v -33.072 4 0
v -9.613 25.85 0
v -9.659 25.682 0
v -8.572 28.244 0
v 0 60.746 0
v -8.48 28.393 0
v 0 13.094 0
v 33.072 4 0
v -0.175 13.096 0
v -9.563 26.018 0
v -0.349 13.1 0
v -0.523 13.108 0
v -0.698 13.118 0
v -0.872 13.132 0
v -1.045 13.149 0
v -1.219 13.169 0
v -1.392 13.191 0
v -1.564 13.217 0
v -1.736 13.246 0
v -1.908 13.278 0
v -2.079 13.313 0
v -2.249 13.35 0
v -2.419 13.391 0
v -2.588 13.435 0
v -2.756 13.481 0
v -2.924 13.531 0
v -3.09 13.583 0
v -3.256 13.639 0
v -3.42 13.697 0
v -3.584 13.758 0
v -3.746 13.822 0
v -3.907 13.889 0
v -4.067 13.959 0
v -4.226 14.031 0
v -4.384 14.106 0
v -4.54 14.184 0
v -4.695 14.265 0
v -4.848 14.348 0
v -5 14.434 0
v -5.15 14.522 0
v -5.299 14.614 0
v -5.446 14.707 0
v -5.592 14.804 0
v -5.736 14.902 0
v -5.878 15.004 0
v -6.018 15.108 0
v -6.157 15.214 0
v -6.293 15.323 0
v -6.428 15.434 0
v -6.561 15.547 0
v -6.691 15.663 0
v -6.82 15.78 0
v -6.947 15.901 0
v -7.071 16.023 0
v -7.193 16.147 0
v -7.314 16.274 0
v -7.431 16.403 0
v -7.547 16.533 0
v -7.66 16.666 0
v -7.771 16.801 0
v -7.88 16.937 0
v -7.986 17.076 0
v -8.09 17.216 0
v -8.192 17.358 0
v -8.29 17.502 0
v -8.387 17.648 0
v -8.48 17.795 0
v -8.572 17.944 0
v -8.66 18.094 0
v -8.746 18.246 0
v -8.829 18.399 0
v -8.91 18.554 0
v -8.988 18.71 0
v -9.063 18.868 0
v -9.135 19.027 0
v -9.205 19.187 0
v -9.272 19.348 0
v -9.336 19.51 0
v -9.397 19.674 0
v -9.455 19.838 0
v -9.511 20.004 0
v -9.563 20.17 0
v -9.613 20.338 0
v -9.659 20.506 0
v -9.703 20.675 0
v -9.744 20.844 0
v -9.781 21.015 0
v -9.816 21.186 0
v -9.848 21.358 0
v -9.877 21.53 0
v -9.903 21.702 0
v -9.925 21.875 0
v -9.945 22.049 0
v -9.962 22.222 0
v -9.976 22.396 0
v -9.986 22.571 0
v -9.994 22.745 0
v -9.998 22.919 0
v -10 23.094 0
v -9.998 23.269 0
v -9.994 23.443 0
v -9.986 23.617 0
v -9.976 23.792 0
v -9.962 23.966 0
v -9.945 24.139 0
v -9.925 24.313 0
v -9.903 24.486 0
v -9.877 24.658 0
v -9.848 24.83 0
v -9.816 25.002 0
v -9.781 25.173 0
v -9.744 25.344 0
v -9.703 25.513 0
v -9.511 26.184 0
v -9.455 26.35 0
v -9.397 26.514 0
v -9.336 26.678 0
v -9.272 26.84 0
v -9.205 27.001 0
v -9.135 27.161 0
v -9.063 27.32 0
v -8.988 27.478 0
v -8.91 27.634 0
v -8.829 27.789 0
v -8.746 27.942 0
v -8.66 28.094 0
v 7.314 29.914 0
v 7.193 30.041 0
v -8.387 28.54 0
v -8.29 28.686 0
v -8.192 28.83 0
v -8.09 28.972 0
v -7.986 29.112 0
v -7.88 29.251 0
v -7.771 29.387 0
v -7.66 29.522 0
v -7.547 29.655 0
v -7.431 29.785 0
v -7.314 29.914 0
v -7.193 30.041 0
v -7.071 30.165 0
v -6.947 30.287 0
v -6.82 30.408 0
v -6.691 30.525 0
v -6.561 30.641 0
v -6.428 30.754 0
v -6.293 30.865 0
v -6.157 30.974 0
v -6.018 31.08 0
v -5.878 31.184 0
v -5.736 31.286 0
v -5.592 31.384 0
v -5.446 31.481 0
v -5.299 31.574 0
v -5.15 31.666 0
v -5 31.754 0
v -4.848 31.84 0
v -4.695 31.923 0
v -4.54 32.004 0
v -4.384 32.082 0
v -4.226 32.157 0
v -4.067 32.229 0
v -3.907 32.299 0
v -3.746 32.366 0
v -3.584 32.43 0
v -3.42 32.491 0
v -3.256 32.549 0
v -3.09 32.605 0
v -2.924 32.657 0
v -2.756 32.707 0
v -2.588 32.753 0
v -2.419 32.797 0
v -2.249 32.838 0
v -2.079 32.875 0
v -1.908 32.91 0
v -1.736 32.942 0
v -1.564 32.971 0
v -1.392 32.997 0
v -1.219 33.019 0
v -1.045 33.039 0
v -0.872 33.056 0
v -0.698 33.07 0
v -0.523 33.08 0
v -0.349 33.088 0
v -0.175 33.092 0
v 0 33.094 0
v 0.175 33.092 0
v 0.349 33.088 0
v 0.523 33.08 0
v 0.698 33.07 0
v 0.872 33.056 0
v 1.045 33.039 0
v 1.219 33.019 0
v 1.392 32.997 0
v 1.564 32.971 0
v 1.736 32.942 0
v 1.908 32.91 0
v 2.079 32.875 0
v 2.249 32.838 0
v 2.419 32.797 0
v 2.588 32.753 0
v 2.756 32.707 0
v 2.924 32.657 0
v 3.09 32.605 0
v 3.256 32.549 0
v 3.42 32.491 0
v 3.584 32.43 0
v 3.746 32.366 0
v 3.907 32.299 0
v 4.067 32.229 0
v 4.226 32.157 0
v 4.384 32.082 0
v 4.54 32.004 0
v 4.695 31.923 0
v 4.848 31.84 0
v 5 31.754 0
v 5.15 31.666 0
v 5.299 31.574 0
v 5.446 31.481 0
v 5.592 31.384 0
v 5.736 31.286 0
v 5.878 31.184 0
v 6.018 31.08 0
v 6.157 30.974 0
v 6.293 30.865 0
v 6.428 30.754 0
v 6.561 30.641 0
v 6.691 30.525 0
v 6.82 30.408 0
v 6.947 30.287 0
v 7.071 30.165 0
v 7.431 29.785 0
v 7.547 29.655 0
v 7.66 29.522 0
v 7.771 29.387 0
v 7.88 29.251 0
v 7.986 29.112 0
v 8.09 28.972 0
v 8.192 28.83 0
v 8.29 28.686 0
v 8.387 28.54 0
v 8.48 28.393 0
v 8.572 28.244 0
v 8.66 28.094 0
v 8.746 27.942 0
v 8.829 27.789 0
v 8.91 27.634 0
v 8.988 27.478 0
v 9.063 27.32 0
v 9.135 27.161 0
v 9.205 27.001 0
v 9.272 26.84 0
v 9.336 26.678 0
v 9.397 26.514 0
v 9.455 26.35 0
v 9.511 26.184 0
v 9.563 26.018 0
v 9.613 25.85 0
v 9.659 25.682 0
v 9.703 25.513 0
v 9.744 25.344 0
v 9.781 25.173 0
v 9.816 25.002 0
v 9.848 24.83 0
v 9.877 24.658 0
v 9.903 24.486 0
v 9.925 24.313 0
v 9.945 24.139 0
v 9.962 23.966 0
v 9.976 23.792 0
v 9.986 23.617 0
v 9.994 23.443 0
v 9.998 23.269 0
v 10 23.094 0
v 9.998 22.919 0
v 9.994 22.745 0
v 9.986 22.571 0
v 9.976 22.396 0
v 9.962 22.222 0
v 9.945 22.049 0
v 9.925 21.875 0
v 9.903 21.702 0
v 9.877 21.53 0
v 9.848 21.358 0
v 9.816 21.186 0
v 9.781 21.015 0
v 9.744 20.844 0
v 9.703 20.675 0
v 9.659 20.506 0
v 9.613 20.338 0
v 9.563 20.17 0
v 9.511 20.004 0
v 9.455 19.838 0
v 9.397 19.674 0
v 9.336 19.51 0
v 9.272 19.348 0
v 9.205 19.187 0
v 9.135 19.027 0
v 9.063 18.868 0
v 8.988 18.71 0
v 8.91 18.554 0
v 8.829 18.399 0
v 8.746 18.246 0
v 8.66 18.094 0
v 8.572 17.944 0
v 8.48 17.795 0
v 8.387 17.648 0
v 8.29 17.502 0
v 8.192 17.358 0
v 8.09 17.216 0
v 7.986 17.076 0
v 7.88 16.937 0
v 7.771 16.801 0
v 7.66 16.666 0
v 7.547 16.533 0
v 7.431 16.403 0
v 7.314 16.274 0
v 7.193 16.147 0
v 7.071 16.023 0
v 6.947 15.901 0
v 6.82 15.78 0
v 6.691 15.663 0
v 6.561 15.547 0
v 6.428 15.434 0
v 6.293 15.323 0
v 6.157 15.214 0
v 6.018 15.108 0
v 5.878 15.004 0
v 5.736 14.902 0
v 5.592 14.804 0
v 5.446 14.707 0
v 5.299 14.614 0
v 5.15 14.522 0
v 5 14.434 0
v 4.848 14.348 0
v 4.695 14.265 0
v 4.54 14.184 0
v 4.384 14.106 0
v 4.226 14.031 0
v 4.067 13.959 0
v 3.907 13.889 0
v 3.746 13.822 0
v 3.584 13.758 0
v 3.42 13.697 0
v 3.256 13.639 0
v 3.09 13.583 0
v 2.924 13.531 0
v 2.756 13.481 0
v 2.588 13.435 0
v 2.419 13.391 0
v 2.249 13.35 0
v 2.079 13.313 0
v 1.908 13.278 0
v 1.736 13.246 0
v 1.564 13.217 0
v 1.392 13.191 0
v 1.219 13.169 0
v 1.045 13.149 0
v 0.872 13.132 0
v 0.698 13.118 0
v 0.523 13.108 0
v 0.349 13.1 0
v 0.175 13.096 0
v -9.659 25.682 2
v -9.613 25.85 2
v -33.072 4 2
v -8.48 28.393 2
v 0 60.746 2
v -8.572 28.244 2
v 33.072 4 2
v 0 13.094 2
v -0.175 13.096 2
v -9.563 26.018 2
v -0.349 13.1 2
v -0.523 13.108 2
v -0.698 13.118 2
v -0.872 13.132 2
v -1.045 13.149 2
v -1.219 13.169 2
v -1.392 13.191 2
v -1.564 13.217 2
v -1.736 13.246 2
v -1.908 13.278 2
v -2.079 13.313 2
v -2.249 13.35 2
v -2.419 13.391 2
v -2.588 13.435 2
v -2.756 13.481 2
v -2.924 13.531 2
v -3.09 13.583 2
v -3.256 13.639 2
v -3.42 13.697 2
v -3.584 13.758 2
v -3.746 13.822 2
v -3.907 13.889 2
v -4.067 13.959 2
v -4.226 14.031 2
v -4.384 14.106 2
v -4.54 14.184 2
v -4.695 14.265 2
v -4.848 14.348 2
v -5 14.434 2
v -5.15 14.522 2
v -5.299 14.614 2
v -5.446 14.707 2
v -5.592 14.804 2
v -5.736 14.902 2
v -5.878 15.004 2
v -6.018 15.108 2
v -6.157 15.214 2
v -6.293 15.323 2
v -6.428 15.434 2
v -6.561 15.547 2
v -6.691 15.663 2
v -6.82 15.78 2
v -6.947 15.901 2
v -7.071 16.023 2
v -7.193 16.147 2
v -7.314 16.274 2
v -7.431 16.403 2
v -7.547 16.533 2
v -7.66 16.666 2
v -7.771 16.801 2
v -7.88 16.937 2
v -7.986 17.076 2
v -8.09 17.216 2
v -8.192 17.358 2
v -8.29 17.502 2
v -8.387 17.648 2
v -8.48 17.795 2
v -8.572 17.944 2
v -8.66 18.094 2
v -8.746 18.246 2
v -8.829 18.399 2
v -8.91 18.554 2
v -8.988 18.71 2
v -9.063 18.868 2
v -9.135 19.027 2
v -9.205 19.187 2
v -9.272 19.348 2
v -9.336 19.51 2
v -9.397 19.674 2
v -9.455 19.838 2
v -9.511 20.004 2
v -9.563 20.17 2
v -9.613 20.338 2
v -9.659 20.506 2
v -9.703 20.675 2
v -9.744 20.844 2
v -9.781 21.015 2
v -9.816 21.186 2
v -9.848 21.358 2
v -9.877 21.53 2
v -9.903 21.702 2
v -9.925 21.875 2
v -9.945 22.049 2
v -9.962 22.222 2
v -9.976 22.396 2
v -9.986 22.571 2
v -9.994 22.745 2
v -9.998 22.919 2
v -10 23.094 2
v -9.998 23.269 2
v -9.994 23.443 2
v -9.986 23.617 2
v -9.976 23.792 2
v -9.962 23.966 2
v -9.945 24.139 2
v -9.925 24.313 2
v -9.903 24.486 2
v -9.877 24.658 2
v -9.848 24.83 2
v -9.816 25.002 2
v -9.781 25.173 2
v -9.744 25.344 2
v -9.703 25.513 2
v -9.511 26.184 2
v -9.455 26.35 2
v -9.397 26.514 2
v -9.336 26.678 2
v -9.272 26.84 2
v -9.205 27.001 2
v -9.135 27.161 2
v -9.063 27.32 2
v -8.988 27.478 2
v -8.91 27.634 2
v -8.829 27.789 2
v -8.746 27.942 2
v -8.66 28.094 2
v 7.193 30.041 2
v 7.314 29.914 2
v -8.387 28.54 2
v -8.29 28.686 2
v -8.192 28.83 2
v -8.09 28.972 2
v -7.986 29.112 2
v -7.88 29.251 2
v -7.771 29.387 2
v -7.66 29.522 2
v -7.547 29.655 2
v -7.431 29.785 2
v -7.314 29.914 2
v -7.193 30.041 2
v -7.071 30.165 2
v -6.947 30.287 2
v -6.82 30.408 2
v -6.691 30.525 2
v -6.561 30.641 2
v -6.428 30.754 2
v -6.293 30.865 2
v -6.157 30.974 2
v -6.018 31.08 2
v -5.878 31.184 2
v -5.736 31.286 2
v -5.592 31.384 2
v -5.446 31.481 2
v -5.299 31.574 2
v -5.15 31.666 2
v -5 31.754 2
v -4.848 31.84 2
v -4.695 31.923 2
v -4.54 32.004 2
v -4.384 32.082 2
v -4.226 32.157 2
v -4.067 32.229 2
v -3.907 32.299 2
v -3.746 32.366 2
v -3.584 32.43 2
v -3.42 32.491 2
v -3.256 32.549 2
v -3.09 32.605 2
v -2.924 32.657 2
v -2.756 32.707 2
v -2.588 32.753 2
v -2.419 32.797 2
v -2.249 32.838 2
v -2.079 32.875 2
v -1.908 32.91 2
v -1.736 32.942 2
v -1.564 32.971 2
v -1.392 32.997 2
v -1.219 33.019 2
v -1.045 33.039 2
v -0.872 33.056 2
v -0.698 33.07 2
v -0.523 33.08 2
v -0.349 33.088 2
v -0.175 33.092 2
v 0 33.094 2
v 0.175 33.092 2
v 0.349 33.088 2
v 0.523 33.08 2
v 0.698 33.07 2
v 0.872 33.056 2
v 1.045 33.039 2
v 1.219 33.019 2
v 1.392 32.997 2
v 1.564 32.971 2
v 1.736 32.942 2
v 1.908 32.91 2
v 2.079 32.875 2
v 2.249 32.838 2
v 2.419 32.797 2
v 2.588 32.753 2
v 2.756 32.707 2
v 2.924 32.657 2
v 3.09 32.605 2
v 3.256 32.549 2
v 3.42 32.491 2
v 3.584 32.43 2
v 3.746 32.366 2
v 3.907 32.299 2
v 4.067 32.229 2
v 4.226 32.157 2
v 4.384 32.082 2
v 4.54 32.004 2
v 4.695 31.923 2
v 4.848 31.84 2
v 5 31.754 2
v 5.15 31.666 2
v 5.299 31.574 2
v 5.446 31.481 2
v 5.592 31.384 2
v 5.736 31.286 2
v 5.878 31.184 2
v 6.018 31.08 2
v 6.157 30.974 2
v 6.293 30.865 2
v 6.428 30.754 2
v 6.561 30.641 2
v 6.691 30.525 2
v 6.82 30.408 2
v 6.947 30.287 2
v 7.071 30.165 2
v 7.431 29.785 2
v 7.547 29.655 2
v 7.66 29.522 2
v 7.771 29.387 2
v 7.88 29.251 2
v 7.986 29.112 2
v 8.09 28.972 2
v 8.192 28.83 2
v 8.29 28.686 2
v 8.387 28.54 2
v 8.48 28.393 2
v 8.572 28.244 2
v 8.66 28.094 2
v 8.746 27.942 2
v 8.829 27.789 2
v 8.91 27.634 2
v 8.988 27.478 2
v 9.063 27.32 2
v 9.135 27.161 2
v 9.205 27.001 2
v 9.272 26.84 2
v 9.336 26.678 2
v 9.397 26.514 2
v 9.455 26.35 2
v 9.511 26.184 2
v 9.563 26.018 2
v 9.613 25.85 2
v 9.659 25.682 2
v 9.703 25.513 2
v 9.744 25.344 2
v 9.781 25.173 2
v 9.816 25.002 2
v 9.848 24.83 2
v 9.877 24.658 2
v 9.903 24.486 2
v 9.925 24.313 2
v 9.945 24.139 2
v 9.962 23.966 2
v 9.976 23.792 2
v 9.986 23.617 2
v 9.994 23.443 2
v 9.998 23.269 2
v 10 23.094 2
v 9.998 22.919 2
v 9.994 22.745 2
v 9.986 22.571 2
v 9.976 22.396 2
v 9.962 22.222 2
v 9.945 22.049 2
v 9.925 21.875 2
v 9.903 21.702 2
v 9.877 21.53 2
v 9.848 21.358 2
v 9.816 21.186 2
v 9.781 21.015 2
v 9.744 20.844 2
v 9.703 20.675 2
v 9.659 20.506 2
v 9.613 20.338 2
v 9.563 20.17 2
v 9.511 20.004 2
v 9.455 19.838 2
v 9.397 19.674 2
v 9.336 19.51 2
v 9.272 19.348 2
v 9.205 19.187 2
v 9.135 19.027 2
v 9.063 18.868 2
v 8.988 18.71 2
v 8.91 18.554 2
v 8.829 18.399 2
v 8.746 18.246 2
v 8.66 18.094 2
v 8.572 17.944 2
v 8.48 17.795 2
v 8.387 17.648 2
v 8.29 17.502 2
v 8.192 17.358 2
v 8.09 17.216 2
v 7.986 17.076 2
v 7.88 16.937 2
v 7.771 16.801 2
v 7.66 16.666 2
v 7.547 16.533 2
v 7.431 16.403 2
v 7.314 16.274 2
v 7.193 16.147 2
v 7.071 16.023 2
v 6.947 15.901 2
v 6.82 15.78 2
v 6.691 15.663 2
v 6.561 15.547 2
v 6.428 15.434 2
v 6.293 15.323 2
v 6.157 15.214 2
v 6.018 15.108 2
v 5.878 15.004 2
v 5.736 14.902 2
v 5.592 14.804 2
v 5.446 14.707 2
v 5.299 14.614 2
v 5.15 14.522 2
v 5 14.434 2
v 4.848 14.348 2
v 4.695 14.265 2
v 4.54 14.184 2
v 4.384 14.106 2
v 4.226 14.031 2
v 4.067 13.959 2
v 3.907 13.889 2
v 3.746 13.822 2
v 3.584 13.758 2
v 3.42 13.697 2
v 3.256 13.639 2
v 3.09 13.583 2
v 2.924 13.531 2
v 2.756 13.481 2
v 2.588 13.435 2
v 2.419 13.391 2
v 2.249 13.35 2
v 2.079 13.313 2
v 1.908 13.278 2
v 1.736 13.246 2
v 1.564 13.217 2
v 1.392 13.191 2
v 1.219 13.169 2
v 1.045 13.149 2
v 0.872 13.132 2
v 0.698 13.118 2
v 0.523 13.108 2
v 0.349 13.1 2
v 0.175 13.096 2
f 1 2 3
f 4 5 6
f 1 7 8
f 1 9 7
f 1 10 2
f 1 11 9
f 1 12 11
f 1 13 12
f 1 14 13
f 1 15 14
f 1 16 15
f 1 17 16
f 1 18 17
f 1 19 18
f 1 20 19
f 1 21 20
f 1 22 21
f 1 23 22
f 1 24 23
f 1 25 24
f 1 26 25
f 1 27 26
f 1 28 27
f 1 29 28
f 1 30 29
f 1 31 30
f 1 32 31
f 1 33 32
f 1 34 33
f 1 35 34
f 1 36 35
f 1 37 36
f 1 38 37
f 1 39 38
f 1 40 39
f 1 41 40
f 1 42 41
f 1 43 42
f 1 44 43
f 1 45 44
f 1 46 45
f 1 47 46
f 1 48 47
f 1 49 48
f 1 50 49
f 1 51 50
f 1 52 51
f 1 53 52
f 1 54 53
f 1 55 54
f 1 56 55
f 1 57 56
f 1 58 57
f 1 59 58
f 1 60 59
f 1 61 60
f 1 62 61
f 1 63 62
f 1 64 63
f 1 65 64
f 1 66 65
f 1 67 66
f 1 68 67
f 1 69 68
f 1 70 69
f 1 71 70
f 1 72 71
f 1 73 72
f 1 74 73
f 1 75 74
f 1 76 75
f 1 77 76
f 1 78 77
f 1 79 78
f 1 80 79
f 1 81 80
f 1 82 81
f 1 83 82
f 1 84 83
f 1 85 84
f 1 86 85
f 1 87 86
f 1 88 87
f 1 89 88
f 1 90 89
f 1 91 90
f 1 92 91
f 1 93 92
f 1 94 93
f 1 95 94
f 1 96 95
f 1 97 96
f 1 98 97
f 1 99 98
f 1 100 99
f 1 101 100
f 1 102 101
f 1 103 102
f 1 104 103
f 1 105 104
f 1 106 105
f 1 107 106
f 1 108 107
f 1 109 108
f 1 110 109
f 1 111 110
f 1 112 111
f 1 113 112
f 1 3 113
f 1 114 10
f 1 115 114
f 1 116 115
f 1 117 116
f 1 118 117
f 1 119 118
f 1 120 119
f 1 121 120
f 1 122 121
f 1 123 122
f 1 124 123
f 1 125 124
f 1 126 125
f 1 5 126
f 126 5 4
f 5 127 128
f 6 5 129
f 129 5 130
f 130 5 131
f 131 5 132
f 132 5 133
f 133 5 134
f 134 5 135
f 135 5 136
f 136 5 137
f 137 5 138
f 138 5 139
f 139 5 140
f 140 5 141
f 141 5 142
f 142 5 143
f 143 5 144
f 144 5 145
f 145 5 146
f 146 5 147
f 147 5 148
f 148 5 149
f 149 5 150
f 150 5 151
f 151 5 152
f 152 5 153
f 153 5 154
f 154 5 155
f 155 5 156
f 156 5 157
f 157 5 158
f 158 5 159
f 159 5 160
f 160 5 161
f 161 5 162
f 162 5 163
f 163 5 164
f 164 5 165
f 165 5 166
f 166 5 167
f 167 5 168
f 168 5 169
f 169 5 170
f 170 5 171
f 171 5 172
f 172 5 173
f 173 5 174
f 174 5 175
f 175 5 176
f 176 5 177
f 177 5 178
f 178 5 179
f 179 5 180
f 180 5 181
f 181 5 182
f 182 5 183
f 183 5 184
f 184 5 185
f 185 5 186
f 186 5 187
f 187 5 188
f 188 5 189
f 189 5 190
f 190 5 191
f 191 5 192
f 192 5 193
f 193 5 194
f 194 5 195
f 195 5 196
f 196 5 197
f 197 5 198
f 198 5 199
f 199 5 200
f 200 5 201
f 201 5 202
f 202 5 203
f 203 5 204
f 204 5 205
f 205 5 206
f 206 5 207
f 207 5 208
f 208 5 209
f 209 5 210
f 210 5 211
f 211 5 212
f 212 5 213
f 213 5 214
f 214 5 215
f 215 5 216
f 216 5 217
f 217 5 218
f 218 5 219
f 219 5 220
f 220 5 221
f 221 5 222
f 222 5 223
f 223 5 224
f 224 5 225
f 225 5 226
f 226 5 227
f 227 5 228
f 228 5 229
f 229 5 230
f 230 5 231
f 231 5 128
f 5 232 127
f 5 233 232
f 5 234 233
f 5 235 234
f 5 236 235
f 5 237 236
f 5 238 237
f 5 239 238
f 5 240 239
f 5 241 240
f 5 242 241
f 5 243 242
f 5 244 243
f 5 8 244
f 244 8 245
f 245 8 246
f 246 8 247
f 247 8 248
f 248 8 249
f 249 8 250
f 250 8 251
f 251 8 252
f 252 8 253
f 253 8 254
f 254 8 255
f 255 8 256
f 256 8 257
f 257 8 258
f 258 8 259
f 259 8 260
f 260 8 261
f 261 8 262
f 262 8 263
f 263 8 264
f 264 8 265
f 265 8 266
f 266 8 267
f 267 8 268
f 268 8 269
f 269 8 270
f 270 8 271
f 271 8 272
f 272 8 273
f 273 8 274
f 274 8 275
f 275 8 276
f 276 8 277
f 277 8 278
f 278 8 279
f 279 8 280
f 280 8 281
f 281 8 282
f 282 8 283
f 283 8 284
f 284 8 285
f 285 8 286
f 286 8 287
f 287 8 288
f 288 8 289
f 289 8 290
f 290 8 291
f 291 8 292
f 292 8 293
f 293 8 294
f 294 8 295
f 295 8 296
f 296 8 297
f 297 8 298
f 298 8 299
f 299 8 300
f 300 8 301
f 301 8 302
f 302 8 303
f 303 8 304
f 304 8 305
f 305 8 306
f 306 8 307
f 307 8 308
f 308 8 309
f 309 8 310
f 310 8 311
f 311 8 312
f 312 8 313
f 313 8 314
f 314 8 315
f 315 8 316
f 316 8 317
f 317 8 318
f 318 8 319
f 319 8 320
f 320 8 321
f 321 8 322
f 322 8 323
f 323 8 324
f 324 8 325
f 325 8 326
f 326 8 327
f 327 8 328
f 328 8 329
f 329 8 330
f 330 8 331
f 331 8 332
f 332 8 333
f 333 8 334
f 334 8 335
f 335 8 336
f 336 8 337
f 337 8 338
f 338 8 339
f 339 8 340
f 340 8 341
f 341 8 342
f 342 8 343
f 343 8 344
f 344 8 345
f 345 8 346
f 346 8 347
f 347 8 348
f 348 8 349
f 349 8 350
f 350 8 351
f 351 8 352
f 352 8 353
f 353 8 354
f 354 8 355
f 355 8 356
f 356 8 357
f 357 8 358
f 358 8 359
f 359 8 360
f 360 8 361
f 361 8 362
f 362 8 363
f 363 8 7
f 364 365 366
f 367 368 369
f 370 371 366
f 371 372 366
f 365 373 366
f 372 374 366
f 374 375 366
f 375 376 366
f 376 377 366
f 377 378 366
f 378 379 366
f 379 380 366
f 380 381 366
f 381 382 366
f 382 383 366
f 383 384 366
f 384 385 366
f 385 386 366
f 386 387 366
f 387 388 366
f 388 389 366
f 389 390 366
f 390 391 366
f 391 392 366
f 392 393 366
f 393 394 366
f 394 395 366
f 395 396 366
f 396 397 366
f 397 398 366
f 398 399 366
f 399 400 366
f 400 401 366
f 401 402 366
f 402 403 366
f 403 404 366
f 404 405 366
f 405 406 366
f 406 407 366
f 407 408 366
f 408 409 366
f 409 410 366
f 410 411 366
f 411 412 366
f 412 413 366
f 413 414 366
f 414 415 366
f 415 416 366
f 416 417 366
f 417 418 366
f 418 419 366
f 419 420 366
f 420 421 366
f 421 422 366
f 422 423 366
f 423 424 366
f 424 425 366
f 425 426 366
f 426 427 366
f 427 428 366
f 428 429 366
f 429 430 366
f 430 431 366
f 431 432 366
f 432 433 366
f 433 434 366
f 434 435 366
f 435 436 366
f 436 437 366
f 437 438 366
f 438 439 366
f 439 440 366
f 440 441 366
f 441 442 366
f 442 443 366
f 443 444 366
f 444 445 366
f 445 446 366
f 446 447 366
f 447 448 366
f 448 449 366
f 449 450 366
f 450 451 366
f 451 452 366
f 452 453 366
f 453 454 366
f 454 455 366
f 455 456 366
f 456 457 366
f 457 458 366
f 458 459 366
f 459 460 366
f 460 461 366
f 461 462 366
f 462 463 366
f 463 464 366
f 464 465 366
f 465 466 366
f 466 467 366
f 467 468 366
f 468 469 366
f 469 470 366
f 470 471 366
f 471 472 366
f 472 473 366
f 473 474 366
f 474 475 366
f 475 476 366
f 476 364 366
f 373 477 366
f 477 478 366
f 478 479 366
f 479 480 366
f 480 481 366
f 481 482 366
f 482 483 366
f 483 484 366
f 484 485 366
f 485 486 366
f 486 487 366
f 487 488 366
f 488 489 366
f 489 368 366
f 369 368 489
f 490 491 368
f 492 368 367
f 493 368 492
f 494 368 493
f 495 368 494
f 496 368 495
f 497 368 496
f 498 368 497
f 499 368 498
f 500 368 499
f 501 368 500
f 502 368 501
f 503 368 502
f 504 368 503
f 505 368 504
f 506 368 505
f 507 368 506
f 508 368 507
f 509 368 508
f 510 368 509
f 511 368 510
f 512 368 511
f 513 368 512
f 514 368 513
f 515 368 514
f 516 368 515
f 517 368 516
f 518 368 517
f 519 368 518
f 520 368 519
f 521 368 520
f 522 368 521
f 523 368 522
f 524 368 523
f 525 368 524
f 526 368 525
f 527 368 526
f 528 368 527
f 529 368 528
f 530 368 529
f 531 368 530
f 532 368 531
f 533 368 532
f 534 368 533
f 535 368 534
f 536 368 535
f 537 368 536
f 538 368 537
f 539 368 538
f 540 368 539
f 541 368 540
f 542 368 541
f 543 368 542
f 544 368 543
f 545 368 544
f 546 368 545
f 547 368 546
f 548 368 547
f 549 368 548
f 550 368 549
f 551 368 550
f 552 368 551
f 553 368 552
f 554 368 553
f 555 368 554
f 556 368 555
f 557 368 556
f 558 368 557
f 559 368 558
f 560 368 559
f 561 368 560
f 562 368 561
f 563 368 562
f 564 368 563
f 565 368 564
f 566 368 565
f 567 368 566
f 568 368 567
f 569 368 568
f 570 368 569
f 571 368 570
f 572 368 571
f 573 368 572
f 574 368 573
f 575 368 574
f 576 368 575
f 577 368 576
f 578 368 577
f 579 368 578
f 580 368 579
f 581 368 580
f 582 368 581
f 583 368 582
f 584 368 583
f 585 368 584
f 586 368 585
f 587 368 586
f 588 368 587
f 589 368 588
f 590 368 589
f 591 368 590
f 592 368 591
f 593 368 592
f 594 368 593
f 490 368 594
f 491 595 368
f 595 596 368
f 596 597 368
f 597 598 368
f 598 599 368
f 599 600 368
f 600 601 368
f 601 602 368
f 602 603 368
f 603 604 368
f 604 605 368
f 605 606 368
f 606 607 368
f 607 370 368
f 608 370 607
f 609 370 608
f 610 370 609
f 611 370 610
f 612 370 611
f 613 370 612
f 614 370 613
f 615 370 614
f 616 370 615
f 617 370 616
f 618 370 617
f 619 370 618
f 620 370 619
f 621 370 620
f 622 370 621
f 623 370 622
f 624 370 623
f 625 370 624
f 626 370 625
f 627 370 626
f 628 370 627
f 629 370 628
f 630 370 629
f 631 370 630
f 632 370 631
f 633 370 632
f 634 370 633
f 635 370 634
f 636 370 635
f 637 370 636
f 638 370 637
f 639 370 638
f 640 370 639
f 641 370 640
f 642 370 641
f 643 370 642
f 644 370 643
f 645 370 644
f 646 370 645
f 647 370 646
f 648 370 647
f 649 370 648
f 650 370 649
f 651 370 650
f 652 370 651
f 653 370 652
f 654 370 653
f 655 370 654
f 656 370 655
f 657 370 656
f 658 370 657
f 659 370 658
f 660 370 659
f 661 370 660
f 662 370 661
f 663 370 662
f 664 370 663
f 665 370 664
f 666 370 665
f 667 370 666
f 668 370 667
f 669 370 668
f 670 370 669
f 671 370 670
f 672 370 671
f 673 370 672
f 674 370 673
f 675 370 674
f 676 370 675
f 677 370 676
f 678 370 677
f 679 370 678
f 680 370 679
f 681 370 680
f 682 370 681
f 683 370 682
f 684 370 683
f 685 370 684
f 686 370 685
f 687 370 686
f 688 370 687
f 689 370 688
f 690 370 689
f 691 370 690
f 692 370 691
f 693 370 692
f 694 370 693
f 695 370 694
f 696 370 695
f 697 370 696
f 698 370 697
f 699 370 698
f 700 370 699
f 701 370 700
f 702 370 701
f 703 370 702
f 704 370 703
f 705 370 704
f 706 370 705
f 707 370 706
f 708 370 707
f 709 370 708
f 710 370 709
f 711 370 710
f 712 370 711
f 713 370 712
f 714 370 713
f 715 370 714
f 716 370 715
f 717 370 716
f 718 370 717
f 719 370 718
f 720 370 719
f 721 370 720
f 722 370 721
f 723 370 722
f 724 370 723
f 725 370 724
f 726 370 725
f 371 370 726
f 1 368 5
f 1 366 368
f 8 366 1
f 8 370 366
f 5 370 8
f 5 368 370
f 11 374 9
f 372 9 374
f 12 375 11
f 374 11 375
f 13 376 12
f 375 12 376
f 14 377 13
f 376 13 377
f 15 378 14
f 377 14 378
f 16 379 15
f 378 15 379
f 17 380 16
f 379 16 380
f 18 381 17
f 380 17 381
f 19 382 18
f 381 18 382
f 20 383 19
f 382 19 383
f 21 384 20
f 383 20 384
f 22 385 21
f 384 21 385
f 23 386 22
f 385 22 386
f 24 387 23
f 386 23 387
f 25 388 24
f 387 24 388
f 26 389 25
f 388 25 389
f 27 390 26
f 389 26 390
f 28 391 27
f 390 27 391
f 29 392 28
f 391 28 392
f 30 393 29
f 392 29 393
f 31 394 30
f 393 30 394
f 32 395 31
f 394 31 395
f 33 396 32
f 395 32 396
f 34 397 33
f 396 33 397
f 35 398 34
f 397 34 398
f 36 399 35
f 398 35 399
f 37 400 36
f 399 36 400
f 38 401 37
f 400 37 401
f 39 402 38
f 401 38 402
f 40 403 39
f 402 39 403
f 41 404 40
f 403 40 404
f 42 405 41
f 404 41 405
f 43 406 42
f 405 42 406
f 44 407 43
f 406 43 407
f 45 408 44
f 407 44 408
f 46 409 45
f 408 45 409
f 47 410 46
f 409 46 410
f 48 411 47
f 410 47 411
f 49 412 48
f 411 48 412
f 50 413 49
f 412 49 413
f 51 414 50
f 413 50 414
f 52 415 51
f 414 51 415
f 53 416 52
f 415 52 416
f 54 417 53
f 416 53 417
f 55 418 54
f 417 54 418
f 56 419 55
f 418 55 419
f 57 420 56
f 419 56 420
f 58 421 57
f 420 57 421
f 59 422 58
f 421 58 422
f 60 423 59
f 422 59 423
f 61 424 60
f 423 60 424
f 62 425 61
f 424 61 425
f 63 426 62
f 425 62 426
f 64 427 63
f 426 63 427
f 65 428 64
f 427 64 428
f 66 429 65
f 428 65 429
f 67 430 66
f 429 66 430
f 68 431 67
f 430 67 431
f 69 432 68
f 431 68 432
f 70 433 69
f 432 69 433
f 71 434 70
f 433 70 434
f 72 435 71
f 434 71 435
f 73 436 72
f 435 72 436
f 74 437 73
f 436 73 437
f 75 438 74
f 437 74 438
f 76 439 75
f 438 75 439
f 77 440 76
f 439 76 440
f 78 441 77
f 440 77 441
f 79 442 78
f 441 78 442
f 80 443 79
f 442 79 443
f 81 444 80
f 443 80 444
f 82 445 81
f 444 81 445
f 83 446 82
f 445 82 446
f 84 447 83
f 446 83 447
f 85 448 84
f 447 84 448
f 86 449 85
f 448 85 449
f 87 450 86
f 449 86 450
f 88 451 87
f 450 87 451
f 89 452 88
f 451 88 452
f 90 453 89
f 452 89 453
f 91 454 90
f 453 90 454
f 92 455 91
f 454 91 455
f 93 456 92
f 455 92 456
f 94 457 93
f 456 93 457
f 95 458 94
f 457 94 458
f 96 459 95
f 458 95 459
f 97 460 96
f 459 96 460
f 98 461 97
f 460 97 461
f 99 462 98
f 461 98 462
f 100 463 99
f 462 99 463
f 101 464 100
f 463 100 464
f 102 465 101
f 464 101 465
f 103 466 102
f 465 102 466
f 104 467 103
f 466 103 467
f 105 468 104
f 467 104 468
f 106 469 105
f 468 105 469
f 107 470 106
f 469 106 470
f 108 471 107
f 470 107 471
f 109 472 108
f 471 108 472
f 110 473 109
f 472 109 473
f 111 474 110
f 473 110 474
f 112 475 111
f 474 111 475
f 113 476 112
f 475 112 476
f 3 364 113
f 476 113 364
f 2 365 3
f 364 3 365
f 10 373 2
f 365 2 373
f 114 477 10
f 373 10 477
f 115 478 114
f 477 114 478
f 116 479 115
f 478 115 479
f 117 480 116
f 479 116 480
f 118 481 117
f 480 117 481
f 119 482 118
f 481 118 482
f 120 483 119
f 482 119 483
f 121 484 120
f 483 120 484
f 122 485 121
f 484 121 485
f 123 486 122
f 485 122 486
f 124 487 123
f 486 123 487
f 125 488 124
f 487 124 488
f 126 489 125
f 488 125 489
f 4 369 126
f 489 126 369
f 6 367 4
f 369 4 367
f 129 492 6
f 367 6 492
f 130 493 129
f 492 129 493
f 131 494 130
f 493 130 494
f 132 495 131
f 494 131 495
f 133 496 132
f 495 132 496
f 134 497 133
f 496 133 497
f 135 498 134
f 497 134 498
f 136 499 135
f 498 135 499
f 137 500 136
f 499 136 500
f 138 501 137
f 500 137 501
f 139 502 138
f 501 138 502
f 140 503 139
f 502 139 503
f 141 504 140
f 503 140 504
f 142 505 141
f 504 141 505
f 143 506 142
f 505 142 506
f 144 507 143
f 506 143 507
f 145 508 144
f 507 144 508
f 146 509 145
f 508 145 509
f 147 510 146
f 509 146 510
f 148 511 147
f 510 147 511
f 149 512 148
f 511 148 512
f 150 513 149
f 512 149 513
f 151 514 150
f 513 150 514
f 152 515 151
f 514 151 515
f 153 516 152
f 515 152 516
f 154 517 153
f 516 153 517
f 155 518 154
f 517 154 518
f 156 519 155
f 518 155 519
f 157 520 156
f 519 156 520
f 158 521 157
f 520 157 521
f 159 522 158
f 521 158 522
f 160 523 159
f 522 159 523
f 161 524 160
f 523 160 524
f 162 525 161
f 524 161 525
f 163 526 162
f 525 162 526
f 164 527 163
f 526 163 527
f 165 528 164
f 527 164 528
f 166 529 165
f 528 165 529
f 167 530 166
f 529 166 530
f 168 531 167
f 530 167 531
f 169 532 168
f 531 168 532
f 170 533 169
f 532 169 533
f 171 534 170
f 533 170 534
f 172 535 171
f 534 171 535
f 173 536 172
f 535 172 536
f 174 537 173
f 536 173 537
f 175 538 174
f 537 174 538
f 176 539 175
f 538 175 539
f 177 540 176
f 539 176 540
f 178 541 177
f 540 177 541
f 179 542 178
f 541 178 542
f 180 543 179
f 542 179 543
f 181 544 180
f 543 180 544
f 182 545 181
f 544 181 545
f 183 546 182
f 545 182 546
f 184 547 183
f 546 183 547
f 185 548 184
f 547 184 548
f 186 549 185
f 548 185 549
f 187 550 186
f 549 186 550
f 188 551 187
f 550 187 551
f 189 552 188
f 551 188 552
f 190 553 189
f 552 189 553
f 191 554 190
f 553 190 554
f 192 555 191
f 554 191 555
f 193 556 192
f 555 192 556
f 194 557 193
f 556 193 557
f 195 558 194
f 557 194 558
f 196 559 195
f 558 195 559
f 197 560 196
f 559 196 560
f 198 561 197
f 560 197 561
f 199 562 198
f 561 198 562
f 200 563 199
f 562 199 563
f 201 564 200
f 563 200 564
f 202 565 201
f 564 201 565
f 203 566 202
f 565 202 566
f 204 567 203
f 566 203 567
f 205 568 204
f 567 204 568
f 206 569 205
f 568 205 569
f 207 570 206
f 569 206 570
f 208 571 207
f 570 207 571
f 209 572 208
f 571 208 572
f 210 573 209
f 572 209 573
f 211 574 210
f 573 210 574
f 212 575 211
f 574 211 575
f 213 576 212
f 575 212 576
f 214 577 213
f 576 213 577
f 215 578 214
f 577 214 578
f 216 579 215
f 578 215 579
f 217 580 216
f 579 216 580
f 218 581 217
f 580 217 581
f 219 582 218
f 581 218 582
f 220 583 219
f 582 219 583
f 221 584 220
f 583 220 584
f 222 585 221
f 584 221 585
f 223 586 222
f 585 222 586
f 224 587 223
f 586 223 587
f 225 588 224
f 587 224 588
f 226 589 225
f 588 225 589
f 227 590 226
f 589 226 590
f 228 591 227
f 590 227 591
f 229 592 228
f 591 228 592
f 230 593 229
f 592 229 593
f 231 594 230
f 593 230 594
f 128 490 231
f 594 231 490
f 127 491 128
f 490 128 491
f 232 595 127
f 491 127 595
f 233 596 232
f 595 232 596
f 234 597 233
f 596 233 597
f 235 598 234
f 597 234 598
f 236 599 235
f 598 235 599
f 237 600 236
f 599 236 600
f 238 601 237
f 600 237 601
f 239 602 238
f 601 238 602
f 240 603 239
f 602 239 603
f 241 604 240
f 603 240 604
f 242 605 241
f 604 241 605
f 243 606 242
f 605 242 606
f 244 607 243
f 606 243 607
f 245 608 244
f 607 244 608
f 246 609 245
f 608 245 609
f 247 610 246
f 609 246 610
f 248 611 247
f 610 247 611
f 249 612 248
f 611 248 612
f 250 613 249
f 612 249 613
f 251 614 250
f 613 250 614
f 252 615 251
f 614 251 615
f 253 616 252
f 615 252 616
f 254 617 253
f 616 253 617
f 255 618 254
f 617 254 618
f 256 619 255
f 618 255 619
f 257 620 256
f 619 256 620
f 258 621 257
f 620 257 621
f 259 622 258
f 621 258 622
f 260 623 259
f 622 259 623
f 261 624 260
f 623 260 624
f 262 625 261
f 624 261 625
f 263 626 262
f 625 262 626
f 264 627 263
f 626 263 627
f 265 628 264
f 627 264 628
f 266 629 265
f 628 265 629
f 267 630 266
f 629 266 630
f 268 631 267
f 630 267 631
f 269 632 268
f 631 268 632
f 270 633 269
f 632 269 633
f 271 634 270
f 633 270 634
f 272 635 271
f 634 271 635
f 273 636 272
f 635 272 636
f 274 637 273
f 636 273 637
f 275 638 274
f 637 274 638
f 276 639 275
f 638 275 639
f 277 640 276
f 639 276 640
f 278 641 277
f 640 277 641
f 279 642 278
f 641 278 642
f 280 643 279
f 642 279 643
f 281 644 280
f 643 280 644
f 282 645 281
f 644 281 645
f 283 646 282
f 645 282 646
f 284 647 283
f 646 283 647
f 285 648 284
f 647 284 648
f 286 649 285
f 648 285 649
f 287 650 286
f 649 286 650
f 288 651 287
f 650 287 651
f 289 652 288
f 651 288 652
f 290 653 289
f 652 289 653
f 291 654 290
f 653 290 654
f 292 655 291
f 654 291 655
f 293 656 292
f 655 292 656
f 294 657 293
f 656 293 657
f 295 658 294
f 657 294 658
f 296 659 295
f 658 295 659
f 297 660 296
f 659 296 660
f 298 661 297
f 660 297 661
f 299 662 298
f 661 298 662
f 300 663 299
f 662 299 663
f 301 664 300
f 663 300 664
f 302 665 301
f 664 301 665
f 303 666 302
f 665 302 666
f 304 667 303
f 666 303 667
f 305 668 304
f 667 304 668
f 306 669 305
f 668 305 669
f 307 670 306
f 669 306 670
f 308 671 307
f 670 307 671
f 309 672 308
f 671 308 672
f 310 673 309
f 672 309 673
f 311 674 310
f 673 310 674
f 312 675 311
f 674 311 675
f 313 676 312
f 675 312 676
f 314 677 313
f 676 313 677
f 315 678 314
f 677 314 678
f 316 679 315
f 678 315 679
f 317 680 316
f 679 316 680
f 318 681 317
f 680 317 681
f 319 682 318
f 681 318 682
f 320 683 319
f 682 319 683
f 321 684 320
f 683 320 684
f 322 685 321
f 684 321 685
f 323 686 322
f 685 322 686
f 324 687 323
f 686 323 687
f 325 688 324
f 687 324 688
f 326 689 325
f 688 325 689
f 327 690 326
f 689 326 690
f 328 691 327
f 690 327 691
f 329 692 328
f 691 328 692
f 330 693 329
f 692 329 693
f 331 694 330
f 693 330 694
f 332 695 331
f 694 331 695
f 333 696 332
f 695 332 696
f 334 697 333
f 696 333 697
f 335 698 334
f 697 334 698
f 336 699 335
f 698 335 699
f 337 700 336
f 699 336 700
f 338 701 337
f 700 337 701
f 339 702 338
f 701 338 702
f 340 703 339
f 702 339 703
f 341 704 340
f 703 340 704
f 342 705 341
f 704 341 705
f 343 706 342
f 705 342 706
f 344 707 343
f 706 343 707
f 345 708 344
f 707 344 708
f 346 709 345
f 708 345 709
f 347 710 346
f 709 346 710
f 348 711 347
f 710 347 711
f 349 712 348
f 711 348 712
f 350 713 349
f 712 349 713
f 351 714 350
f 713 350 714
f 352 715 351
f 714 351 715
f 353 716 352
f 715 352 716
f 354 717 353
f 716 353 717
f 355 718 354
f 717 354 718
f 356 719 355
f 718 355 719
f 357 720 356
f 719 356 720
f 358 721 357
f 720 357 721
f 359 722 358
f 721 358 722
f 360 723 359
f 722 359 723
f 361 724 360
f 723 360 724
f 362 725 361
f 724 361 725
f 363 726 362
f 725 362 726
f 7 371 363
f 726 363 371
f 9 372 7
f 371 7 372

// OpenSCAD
/* 
 * Stackenlichten-Files I: The top plate
 *
 * kellertuer, 2017-02-19
 */

/*
 * Variables, all Data in mm
 */
wW = 4;    // Thickness/Width of wood
sL = 80;   // sidelength of a triangle
// don't change these values
sH = 2*(wW/tan(60)+wW/sin(60)); //shorten inner
    linear_extrude(height=wW/2)
    difference() {
    polygon(points = [ [-sL/2+sH/2,wW],[sL/2-sH/2,wW],[0,(sL-sH+wW)*sqrt(3)/2]]);
    translate([0,sL*sqrt(3)/6]) circle(10,$fn=360);
    }
